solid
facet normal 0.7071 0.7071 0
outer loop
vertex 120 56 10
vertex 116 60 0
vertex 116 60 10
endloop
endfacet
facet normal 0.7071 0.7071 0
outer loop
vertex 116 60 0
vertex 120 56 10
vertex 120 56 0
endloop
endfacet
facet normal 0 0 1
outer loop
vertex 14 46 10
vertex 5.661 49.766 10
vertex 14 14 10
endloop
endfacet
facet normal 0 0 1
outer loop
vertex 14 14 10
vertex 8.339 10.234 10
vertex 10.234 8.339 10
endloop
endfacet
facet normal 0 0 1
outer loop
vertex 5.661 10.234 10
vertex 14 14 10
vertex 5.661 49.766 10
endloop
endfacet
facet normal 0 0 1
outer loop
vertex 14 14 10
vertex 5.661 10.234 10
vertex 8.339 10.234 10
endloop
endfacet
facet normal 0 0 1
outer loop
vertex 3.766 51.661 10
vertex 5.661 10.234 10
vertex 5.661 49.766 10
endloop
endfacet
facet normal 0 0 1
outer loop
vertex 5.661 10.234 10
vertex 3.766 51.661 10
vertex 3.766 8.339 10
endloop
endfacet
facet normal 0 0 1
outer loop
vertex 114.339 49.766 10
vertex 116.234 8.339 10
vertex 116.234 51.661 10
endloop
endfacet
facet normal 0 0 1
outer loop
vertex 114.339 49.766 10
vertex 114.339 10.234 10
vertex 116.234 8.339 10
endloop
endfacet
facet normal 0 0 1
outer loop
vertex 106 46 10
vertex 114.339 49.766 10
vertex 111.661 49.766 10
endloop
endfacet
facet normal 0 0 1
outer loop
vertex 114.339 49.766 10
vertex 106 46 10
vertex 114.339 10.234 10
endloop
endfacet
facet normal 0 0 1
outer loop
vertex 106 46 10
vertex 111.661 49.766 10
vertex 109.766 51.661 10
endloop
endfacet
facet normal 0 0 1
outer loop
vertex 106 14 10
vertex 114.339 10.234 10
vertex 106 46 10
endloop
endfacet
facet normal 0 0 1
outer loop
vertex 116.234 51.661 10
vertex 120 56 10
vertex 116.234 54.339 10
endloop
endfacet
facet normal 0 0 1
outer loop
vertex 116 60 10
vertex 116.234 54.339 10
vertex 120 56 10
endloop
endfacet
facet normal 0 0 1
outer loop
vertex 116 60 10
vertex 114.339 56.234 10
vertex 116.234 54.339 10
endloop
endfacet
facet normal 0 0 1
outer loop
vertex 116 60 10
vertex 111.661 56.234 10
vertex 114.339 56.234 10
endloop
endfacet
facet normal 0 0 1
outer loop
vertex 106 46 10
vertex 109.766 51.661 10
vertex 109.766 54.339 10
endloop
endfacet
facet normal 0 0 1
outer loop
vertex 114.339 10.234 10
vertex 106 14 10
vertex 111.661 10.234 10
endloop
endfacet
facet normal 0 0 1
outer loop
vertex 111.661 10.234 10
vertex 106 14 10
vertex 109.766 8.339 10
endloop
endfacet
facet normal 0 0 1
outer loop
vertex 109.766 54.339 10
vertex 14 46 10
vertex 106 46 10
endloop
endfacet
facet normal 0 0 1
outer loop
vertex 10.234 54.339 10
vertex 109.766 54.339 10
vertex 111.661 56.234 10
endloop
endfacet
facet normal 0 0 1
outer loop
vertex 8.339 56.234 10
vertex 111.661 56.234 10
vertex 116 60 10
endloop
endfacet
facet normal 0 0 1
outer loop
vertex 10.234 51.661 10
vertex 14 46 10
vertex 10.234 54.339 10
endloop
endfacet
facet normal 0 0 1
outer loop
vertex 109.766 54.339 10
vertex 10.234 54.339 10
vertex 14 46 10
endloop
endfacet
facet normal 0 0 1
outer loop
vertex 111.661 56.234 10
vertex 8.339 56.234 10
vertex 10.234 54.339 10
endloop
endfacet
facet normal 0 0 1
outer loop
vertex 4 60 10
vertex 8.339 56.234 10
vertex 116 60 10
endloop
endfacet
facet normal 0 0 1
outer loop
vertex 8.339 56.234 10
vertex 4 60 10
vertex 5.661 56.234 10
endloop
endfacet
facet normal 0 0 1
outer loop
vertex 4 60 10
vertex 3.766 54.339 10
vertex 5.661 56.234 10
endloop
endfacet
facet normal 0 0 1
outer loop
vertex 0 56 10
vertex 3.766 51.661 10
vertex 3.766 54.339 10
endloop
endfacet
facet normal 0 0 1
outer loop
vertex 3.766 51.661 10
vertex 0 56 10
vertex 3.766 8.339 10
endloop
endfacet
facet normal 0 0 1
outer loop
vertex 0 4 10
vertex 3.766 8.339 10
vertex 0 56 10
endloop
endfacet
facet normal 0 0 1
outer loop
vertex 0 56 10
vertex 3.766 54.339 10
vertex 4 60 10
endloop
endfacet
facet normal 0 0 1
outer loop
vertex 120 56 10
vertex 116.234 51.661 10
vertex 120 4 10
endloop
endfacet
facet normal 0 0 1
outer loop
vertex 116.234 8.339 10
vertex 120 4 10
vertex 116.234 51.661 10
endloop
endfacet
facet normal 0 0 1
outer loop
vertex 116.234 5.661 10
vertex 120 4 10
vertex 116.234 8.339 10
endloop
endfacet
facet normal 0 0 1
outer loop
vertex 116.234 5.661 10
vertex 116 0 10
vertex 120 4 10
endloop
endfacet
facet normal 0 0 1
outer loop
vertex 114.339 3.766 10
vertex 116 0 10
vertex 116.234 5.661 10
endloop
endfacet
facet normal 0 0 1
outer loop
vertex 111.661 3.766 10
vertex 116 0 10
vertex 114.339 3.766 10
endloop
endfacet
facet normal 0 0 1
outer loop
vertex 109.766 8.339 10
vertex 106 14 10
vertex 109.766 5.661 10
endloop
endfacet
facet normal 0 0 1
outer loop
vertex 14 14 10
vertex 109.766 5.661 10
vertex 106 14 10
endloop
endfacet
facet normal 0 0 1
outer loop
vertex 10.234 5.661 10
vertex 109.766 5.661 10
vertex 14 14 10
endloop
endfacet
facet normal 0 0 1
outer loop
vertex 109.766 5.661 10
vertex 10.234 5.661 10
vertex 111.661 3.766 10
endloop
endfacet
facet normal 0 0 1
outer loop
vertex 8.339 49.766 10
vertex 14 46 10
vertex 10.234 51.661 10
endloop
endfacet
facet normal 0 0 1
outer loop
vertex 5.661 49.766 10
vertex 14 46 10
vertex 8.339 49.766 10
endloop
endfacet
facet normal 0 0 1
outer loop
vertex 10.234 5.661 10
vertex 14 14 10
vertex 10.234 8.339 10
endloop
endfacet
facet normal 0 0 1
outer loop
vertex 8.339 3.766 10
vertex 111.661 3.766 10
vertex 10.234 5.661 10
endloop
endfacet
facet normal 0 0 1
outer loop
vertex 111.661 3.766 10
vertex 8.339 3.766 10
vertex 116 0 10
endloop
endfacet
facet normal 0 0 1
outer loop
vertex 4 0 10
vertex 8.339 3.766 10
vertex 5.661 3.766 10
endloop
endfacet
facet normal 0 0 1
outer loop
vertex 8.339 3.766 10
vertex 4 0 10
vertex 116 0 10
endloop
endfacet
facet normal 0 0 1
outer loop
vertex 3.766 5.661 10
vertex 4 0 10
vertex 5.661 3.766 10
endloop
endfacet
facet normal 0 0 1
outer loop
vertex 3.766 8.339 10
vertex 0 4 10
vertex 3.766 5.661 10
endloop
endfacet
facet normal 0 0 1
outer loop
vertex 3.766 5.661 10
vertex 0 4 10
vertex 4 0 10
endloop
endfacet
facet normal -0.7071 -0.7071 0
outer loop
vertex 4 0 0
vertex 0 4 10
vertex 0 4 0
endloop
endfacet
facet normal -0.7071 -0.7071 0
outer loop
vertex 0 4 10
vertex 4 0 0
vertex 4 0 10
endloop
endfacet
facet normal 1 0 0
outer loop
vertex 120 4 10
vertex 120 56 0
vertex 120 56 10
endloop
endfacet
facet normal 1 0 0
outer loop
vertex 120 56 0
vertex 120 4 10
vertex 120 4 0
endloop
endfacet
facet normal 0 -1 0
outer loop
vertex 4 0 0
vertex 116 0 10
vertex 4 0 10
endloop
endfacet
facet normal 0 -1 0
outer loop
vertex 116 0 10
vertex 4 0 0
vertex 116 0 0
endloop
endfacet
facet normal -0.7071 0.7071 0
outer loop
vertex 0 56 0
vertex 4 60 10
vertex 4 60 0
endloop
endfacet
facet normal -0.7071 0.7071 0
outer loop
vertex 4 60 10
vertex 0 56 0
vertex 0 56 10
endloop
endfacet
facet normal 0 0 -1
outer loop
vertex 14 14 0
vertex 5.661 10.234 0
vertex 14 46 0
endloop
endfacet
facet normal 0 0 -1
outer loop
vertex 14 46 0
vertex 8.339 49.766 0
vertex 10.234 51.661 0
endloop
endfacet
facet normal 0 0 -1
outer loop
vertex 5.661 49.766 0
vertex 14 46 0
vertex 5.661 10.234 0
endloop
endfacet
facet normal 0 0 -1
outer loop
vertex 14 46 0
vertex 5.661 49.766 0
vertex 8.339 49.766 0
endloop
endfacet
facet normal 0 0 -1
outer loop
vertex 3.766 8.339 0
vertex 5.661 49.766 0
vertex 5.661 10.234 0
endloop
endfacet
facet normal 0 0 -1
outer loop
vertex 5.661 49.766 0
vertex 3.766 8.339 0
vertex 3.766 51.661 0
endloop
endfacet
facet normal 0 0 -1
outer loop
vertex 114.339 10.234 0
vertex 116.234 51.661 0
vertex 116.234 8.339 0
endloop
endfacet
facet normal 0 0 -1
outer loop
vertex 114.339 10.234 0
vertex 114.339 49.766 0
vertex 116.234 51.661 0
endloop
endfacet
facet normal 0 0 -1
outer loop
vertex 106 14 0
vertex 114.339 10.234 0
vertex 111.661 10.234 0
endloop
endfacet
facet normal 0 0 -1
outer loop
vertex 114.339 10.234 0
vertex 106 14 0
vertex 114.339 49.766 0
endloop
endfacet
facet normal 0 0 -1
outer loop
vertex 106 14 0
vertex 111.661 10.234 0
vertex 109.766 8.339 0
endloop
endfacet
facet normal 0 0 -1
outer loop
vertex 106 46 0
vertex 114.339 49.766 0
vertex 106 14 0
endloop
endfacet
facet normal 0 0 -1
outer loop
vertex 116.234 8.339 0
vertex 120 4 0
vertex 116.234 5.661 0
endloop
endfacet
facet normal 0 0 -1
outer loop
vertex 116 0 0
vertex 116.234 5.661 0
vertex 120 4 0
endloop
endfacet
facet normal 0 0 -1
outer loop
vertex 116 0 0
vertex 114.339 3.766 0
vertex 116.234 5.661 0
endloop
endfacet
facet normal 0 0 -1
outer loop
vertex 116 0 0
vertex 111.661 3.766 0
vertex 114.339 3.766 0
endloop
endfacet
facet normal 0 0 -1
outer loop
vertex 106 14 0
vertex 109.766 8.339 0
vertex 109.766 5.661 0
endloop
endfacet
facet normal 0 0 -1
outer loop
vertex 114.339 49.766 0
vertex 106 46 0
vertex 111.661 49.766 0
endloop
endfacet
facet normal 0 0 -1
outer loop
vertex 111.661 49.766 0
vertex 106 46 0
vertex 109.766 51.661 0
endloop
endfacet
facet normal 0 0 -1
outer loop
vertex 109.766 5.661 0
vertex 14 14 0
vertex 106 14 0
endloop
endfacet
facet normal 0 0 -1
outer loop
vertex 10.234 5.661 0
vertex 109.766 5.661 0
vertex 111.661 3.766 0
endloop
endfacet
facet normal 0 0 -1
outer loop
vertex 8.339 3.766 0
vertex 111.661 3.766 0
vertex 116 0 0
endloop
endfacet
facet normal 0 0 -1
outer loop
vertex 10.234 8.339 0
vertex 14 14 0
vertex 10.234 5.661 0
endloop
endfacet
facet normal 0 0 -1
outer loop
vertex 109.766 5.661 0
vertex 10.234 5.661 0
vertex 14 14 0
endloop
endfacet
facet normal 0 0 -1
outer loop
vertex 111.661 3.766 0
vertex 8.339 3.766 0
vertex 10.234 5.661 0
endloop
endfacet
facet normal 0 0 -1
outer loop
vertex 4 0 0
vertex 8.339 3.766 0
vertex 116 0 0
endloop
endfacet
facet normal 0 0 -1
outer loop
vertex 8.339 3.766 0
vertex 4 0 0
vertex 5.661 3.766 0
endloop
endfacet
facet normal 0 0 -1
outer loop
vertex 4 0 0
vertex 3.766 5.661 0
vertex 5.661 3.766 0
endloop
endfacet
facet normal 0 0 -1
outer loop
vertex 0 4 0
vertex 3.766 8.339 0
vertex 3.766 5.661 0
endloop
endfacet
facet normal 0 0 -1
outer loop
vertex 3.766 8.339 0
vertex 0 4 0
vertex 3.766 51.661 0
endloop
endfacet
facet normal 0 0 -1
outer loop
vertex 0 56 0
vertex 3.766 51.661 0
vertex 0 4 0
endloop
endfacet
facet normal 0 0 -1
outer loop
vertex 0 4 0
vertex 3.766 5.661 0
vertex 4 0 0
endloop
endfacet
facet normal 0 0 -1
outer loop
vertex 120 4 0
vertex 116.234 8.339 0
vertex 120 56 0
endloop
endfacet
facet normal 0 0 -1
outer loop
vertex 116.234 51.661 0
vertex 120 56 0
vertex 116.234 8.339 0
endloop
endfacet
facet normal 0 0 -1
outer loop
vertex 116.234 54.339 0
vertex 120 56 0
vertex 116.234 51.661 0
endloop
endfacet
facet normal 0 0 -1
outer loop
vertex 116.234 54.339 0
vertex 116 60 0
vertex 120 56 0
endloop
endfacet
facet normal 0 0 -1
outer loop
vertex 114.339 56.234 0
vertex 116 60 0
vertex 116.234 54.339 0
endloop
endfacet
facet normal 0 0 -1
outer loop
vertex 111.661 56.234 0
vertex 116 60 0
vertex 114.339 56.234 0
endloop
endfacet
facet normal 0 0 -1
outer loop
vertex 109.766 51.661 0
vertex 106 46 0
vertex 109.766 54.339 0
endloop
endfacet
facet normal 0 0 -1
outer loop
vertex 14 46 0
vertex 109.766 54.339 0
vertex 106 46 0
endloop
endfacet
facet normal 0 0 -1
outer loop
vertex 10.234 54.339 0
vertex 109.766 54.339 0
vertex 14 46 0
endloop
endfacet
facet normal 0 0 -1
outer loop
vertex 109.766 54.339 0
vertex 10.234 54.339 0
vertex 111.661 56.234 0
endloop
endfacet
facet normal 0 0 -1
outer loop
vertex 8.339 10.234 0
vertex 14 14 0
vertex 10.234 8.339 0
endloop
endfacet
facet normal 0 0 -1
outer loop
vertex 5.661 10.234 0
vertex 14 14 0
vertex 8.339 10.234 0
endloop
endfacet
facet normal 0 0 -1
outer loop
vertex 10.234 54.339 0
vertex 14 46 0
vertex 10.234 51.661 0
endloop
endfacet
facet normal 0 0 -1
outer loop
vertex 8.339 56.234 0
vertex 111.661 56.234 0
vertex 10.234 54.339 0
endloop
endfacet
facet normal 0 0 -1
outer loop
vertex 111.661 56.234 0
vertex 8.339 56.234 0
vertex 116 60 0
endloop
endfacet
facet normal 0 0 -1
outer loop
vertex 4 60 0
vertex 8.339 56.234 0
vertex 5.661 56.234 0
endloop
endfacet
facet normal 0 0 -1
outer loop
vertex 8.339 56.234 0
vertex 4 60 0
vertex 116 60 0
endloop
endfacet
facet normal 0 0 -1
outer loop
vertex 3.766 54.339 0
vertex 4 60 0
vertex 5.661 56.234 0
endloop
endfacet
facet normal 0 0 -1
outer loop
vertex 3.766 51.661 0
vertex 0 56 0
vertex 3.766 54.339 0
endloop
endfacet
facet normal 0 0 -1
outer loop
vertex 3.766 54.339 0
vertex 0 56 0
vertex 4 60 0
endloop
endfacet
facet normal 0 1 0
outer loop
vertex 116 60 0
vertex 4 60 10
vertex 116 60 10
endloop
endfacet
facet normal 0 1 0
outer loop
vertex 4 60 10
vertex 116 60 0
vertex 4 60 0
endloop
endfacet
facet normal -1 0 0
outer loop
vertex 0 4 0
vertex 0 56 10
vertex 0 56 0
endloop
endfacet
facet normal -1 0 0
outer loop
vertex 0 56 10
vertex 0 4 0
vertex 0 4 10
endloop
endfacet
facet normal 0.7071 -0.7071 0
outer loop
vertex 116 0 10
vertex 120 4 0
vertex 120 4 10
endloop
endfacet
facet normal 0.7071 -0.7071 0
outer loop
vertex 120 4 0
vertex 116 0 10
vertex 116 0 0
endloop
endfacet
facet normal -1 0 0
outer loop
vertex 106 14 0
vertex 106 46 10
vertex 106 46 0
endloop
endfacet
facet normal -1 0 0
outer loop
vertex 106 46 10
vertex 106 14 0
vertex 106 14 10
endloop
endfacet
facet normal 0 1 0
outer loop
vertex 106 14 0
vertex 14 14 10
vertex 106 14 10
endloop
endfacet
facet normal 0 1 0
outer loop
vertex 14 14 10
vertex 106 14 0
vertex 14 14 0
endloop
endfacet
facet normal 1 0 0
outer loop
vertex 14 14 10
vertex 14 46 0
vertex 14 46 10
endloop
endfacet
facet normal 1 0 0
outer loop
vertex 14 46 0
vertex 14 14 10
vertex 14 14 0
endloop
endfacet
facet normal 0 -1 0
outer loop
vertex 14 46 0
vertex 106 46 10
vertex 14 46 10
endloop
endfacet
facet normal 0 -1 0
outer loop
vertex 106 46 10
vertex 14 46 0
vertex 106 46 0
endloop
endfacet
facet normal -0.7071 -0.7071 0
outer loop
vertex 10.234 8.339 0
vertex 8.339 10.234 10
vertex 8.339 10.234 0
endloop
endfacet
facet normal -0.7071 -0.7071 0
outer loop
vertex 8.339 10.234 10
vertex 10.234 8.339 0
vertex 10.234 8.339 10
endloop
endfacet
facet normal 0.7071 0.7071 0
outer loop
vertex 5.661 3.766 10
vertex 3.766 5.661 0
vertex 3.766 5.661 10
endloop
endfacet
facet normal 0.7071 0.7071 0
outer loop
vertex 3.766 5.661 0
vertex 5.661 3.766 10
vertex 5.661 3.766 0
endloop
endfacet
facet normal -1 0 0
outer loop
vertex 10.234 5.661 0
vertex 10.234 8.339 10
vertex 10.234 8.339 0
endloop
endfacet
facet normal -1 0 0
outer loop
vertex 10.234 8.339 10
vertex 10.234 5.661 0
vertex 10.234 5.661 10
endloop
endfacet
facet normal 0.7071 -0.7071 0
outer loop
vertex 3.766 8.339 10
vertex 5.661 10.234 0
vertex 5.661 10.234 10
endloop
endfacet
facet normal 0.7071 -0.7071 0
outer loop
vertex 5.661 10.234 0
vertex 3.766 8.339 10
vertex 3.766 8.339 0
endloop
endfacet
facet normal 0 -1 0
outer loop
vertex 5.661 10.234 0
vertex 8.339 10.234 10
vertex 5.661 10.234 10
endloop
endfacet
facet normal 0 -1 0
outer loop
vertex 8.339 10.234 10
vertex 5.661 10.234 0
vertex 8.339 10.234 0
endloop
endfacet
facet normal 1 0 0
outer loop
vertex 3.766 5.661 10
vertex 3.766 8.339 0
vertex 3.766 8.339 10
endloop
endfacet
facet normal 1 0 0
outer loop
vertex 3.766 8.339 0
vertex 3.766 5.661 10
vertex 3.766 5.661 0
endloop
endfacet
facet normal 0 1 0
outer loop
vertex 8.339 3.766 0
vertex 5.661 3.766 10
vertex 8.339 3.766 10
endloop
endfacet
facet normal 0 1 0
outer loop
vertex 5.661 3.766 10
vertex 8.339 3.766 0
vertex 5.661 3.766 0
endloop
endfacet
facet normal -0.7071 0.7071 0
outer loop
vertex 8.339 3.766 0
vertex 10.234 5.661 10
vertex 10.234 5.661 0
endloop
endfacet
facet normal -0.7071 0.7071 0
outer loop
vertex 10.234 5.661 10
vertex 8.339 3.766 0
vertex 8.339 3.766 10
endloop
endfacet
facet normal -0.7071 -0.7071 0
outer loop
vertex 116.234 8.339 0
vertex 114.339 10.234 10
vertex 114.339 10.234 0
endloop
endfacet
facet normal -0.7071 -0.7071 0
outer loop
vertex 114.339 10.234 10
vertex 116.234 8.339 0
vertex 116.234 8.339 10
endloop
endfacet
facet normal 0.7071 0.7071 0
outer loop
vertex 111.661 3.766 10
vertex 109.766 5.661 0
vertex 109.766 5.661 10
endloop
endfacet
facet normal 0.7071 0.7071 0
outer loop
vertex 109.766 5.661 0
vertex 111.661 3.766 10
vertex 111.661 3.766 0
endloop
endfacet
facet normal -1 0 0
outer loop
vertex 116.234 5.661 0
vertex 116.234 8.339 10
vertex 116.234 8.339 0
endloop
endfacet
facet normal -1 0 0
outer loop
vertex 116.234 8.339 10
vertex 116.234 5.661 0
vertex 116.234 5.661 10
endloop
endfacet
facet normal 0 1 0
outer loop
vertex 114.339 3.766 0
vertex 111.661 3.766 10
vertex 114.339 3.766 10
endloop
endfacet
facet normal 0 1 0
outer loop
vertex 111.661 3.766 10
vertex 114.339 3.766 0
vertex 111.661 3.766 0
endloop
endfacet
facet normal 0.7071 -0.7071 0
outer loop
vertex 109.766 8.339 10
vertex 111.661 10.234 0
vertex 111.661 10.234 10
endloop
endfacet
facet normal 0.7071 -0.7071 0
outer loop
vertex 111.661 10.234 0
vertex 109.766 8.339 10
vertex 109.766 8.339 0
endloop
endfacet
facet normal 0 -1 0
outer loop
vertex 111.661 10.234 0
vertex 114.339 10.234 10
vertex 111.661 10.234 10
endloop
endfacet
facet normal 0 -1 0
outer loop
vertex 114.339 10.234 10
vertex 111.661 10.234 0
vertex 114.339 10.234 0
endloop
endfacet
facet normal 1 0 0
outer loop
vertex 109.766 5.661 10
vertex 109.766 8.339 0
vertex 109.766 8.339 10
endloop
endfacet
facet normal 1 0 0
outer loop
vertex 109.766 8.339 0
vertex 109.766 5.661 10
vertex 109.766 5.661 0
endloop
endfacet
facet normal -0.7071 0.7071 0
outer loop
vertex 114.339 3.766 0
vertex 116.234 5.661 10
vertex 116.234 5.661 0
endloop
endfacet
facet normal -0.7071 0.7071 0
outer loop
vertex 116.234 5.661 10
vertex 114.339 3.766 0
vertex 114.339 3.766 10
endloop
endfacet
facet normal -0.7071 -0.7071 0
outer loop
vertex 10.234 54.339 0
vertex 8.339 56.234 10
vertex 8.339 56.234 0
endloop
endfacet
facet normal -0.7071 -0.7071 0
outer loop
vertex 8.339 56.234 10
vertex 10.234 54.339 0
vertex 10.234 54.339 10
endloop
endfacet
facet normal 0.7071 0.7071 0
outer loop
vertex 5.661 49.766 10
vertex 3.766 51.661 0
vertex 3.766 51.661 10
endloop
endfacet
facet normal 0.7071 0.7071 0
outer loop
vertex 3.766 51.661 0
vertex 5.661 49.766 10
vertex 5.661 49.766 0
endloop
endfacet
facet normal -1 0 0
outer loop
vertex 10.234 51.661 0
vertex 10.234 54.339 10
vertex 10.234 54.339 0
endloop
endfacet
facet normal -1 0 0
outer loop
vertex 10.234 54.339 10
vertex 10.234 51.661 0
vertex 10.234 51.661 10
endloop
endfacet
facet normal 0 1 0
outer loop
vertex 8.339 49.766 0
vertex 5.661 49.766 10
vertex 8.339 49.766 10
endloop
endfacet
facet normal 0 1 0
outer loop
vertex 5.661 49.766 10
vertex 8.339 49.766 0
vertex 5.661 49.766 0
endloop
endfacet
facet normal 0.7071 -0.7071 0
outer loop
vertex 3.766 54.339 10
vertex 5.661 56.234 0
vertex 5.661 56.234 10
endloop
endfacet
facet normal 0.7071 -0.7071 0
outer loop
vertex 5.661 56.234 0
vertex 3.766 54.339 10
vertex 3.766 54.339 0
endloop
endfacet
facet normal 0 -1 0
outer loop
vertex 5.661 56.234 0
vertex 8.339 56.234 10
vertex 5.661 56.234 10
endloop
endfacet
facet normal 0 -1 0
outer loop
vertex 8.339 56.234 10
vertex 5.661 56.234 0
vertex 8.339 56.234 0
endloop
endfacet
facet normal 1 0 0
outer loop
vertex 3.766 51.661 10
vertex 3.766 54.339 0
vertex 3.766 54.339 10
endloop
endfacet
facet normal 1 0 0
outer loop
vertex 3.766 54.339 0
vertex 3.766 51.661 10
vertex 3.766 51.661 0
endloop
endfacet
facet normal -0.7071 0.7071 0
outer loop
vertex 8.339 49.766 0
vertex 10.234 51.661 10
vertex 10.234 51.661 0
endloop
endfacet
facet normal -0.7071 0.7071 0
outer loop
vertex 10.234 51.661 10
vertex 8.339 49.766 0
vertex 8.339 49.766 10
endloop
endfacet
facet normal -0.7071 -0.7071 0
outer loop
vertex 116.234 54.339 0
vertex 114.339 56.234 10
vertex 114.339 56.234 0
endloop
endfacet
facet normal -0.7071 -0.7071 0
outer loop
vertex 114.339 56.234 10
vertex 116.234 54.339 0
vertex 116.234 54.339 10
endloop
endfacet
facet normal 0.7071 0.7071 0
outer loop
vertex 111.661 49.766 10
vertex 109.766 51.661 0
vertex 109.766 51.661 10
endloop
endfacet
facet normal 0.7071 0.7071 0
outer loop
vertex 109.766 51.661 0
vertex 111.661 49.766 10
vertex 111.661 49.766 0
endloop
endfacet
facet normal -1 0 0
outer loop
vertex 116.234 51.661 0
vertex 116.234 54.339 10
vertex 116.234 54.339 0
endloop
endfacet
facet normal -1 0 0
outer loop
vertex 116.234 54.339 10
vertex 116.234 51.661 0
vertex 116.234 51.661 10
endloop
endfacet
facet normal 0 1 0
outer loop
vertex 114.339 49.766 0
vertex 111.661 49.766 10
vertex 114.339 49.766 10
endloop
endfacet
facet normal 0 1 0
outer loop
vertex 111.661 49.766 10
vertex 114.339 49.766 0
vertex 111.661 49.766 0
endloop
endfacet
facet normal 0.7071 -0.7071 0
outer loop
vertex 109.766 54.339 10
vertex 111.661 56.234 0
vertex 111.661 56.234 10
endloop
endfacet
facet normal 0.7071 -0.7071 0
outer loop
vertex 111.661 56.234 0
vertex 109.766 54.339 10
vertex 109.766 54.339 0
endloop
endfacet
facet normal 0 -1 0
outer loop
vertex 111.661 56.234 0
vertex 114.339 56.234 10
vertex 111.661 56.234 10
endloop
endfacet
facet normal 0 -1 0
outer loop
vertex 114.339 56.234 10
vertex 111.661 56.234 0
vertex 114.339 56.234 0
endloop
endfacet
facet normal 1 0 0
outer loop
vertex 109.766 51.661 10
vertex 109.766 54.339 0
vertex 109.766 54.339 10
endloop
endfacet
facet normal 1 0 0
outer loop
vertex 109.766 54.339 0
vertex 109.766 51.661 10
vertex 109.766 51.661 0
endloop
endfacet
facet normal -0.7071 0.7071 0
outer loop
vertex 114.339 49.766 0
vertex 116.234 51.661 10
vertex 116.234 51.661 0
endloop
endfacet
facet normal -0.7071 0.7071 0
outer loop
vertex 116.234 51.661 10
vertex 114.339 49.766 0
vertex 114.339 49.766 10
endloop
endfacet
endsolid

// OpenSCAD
$fn = 32;

// ----------------------------------------------------------------------
// Frame plate: 120 x 60 frame, 14 mm rails
// ----------------------------------------------------------------------

// --- parameters (mm) ---
plate_l = 120;            // plate length, X
plate_w = 60;             // plate width, Y
plate_t = 10;             // plate thickness, Z (extrusion height)
corner_c = 4;             // corner chamfer
frame_bar = 14;           // frame rail width
bolt_r = 3.5;             // corner bolt window radius
bolt_inset = 7;           // bolt centre inset from the edges
fit_tol = 0.05;           // declared fit tolerance (prompt contract)
free_tol = 0.2;           // declared free tolerance (prompt contract)

win_l = plate_l - 2 * frame_bar;  // window length
win_w = plate_w - 2 * frame_bar;  // window width
bolt_d = 2 * bolt_r;  // corner hole diameter

profile = [[4, 0], [116, 0], [120, 4], [120, 56], [116, 60], [4, 60], [0, 56], [0, 4]];  // primary outline, 8 points, counter clockwise
void_1 = [[14, 14], [106, 14], [106, 46], [14, 46]];  // the window, 4 points
void_2 = [[10.234, 8.339], [8.339, 10.234], [5.661, 10.234], [3.766, 8.339], [3.766, 5.661], [5.661, 3.766], [8.339, 3.766], [10.234, 5.661]];  // corner bolt window, 8 points
void_3 = [[116.234, 8.339], [114.339, 10.234], [111.661, 10.234], [109.766, 8.339], [109.766, 5.661], [111.661, 3.766], [114.339, 3.766], [116.234, 5.661]];  // corner bolt window, 8 points
void_4 = [[10.234, 54.339], [8.339, 56.234], [5.661, 56.234], [3.766, 54.339], [3.766, 51.661], [5.661, 49.766], [8.339, 49.766], [10.234, 51.661]];  // corner bolt window, 8 points
void_5 = [[116.234, 54.339], [114.339, 56.234], [111.661, 56.234], [109.766, 54.339], [109.766, 51.661], [111.661, 49.766], [114.339, 49.766], [116.234, 51.661]];  // corner bolt window, 8 points

// --- the one profile operation ---
difference() {
  linear_extrude(height = plate_t) polygon(points = profile);
  translate([0, 0, -1])
    linear_extrude(height = plate_t + 2) polygon(points = void_1);
  translate([0, 0, -1])
    linear_extrude(height = plate_t + 2) polygon(points = void_2);
  translate([0, 0, -1])
    linear_extrude(height = plate_t + 2) polygon(points = void_3);
  translate([0, 0, -1])
    linear_extrude(height = plate_t + 2) polygon(points = void_4);
  translate([0, 0, -1])
    linear_extrude(height = plate_t + 2) polygon(points = void_5);
}
